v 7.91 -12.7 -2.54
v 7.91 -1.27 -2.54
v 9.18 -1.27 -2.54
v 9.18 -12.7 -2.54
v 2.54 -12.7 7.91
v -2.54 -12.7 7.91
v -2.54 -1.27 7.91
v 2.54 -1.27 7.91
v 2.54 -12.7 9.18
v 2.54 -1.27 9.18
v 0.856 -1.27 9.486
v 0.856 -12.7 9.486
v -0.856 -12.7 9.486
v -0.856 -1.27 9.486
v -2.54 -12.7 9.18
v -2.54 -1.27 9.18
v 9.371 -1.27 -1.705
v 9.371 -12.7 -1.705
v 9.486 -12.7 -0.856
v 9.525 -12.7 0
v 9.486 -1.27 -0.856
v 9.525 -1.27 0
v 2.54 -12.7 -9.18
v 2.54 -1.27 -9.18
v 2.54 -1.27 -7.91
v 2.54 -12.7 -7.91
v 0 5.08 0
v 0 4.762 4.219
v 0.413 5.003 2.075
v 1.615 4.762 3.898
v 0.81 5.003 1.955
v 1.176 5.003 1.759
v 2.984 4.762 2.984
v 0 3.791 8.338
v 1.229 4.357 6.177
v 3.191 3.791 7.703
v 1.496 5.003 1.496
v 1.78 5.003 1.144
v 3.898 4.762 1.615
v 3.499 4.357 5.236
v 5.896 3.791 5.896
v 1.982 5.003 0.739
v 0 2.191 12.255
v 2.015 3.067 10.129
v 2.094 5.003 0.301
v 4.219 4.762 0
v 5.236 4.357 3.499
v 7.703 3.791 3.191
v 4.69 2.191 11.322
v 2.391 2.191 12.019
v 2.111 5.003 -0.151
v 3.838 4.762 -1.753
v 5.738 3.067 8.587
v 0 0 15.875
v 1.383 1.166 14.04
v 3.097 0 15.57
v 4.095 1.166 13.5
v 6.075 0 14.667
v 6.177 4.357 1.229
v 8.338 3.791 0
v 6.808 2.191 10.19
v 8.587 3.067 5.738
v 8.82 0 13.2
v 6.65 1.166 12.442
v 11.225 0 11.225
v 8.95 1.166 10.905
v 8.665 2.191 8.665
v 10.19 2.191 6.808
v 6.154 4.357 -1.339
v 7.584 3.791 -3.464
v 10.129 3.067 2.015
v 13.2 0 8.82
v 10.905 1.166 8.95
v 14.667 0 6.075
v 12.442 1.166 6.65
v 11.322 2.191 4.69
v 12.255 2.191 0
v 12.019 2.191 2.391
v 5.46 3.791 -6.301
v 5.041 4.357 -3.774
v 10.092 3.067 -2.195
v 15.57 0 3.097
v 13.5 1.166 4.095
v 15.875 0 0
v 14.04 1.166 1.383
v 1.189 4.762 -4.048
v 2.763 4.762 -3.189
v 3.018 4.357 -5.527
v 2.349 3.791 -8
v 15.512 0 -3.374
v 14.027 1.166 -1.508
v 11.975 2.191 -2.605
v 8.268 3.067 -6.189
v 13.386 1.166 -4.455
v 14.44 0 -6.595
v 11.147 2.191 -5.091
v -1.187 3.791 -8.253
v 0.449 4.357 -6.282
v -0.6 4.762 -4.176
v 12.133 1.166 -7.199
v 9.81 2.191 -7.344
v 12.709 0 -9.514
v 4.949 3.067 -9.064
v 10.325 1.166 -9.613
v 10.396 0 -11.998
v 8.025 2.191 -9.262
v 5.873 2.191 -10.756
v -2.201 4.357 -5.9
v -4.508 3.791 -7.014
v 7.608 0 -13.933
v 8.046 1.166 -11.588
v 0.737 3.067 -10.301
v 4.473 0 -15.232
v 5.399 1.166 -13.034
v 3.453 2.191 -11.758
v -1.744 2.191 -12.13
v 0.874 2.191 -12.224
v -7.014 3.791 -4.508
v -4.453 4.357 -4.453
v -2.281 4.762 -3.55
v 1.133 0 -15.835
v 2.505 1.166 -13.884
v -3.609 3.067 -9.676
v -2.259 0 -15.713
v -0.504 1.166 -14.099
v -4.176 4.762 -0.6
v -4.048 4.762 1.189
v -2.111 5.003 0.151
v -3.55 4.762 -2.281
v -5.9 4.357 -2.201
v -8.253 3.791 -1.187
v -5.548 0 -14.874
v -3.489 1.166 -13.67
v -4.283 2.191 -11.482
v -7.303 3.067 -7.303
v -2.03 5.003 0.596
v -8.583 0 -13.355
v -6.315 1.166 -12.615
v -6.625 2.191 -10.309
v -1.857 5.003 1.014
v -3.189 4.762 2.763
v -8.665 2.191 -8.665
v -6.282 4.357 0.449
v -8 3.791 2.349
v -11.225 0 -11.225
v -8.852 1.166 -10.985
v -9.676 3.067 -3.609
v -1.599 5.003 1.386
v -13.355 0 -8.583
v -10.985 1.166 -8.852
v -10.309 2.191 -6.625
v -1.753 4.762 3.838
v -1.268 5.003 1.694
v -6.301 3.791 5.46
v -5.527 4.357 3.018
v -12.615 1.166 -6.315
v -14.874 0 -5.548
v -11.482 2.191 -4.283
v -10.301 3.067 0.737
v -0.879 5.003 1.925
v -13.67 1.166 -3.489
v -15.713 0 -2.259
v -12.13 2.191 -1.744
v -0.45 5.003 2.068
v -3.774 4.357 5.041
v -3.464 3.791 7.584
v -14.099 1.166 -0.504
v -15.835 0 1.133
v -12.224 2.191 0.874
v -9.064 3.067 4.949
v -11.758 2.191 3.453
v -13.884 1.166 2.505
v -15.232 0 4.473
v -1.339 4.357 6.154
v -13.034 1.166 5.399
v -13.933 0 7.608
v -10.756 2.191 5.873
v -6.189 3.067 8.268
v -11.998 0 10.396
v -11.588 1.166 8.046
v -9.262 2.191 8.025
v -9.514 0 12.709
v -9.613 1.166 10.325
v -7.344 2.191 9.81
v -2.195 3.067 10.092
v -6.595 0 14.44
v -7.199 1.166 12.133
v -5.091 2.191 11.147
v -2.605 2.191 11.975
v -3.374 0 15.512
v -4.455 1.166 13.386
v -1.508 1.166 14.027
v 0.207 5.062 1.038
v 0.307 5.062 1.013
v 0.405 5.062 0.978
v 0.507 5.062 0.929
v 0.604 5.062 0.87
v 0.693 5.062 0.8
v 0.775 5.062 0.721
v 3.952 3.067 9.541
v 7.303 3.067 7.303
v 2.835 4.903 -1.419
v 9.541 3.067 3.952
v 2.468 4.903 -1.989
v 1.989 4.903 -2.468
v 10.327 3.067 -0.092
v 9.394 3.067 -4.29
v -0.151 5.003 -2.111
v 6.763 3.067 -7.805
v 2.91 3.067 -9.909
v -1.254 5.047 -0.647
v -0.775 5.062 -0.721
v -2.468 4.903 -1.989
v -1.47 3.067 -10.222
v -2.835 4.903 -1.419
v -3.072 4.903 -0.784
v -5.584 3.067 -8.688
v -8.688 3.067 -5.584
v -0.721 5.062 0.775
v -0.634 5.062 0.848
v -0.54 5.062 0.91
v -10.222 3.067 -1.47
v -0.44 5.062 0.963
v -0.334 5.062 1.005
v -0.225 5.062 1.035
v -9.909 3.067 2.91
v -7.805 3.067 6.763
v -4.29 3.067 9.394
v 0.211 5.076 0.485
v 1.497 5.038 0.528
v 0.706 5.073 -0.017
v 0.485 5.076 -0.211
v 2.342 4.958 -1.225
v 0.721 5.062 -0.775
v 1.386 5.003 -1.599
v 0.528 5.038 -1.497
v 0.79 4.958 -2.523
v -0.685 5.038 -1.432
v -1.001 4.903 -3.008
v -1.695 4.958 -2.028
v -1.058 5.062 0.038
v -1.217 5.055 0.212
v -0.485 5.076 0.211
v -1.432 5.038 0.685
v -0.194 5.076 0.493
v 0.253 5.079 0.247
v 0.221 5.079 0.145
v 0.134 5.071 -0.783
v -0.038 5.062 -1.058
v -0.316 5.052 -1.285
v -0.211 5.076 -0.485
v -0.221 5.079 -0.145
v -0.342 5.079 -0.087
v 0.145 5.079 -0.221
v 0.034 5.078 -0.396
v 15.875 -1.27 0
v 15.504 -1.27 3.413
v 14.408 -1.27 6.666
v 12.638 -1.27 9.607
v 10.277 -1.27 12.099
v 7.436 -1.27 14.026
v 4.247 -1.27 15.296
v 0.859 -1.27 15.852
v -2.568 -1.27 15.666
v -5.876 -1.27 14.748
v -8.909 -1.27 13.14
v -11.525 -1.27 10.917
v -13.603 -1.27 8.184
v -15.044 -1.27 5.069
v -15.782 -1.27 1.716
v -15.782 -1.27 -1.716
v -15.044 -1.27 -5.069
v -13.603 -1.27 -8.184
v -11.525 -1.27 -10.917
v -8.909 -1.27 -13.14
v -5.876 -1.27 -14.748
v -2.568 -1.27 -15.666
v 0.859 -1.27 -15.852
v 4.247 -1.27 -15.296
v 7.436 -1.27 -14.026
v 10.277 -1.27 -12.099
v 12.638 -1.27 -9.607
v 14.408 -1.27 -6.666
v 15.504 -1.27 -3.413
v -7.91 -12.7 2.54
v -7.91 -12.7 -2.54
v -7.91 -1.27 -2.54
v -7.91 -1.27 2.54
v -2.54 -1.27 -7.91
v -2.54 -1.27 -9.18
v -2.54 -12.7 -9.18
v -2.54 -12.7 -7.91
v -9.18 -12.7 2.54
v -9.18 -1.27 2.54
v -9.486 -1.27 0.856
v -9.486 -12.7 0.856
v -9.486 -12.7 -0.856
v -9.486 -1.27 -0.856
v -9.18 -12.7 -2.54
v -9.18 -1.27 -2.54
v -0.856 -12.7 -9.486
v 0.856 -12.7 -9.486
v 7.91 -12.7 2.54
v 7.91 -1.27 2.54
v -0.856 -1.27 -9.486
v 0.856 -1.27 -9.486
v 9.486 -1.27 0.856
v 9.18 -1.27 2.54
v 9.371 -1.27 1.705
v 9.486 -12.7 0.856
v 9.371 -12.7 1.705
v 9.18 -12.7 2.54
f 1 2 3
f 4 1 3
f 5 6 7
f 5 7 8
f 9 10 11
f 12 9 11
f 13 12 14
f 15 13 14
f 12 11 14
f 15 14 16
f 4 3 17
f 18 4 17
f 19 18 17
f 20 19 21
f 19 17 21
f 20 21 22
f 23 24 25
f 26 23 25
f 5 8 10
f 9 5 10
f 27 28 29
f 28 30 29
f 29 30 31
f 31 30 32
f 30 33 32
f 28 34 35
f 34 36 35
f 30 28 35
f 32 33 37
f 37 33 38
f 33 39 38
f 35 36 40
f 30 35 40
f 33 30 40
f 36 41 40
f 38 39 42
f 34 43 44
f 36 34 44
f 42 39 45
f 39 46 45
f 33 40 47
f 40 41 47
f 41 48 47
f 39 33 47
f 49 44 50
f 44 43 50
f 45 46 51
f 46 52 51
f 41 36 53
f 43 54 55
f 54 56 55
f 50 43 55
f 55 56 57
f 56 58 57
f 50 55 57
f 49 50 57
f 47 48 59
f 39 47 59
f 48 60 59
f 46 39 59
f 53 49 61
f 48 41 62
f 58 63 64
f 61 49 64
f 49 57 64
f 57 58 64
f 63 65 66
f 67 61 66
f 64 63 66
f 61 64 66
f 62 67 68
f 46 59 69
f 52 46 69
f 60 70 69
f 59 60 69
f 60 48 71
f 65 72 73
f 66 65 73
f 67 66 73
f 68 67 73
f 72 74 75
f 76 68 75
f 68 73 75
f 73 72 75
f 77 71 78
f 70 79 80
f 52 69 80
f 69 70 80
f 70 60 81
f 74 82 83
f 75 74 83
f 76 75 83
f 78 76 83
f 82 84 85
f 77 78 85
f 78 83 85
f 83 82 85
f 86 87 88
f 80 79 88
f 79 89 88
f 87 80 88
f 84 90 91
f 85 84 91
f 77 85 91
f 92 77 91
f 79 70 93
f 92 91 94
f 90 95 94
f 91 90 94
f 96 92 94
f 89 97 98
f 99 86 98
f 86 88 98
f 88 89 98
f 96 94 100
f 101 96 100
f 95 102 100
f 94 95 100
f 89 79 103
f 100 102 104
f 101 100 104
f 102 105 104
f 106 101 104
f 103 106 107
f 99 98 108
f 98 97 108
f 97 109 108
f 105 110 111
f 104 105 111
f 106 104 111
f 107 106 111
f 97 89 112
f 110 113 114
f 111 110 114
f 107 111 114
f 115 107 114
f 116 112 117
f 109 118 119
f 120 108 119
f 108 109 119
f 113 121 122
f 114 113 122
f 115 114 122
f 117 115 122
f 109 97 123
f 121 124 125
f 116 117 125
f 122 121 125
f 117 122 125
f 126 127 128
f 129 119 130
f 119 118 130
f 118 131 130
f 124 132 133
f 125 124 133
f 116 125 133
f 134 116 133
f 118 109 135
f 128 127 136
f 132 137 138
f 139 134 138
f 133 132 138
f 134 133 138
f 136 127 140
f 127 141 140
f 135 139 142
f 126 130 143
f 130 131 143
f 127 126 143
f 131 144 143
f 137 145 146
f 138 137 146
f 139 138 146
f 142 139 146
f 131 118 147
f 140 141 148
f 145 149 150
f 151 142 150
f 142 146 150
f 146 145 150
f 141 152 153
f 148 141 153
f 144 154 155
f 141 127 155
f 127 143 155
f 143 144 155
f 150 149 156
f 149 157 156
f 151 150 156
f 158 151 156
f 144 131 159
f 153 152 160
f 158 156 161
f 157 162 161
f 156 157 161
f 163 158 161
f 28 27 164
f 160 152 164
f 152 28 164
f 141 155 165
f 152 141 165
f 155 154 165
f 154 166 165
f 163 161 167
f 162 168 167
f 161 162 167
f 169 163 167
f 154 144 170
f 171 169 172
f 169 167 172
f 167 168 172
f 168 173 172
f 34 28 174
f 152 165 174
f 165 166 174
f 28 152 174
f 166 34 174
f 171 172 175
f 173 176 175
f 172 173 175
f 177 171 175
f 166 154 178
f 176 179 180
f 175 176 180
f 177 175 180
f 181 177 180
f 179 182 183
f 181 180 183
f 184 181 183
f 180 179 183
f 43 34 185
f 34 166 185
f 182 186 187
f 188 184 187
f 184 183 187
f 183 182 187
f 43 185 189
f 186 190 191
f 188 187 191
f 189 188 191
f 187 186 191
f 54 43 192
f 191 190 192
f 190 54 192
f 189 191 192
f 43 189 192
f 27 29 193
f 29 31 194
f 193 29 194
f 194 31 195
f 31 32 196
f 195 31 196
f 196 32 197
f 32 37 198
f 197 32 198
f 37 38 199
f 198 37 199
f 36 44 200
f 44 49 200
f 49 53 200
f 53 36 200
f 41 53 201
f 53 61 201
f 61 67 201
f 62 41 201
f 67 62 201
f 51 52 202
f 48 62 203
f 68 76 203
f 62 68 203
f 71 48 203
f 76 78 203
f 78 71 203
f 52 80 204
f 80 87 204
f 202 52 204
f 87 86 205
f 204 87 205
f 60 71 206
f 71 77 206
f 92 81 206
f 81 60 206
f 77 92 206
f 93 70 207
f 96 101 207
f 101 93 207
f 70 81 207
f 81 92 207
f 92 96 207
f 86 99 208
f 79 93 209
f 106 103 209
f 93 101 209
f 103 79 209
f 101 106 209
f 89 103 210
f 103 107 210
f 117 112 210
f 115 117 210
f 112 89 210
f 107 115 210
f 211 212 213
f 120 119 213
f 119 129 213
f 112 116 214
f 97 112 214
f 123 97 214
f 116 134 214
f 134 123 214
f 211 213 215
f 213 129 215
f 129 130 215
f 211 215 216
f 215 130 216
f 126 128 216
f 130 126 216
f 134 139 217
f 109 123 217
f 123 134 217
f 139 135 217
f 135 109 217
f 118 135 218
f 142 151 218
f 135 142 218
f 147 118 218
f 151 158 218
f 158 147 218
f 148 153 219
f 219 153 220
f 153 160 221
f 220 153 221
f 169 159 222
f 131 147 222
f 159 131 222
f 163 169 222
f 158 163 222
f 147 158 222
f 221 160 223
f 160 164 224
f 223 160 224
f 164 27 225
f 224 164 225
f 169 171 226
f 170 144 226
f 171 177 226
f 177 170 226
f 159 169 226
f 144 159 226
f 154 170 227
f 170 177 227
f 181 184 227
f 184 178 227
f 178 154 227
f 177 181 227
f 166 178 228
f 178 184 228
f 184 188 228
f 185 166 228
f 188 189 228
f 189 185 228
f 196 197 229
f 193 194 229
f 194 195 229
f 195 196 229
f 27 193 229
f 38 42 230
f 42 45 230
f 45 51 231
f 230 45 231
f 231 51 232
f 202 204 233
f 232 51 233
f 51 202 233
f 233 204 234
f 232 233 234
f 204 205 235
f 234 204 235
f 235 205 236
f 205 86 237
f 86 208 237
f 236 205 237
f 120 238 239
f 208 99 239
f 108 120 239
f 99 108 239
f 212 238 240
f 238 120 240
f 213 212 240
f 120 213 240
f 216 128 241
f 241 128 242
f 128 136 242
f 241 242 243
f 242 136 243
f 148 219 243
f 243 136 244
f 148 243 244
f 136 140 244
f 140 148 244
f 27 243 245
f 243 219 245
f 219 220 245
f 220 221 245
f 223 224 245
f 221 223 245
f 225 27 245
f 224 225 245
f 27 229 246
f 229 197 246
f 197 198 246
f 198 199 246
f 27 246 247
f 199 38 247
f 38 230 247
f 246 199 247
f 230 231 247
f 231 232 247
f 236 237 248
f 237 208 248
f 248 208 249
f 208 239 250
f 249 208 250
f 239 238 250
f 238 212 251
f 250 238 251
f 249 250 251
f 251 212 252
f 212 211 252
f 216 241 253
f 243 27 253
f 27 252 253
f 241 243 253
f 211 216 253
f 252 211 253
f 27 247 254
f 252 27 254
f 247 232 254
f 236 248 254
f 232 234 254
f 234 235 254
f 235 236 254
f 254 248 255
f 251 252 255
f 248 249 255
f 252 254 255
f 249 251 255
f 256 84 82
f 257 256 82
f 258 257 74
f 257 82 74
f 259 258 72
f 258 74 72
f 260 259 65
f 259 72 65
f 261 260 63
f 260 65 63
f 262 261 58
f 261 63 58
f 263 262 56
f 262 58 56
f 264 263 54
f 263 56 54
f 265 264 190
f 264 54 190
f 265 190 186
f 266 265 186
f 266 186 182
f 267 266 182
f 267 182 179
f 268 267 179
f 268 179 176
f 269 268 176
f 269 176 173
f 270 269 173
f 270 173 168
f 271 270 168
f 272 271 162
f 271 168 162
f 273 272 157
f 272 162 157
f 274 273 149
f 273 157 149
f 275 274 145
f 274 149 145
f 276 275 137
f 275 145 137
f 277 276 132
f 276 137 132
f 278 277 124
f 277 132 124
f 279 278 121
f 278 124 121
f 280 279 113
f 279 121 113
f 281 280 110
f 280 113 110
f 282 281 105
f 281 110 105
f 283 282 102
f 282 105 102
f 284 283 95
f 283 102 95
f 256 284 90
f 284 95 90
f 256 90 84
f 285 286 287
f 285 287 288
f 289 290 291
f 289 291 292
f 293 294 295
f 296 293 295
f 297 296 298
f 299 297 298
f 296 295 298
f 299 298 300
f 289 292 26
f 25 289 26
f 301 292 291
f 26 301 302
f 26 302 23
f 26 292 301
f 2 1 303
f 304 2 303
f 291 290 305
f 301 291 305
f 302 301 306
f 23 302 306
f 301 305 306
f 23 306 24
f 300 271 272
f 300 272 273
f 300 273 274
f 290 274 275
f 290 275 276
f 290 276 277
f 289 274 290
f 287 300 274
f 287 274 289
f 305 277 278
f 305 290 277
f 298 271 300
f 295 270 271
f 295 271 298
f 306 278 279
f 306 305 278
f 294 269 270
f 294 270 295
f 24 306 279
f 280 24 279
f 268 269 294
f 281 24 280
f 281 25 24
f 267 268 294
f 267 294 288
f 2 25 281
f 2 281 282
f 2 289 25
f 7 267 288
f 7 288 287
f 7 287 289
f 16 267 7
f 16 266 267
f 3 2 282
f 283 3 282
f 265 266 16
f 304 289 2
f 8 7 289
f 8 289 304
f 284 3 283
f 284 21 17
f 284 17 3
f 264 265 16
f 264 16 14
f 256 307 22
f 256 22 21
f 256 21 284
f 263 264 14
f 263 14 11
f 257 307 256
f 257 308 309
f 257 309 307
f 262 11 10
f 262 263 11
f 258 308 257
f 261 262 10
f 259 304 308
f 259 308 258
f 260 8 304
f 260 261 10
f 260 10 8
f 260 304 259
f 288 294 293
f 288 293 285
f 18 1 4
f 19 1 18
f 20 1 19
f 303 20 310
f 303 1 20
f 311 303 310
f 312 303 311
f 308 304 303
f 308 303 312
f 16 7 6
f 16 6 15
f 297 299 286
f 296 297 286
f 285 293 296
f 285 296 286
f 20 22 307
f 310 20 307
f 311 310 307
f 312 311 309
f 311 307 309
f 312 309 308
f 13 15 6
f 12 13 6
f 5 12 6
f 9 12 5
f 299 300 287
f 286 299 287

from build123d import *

# Parameters (mm, degrees)
F0_W      = 5.08
F0_H      = 1.27
F0_W_2    = 1.27
F0_H_2    = 5.08
F1_DEPTH  = 12.7
F3_FACE_R = 15.875
F4_DEPTH  = 1.27


with BuildPart() as f1:
    # F0 (on Front) → F1 (new body)
    with BuildSketch(Plane.XZ):
        with Locations((0, 8.545089)):
            Rectangle(F0_W, F0_H)
        with BuildLine():
            Line((-2.54, 9.180089), (2.54, 9.180089))
            ThreePointArc((2.54, 9.180089), (0, 9.525), (-2.54, 9.180089))
        make_face()
        with Locations((-8.545089, 0)):
            Rectangle(F0_W_2, F0_H_2)
        with BuildLine():
            Line((-9.180089, -2.54), (-9.180089, 2.54))
            ThreePointArc((-9.180089, 2.54), (-9.525, 0), (-9.180089, -2.54))
        make_face()
        with BuildLine():
            ThreePointArc((-2.54, -9.180089), (0, -9.525), (2.54, -9.180089))
            Line((2.54, -9.180089), (-2.54, -9.180089))
        make_face()
        with Locations((0, -8.545089)):
            Rectangle(F0_W, F0_H)
        with Locations((8.545089, 0)):
            Rectangle(F0_W_2, F0_H_2)
        with BuildLine():
            ThreePointArc((9.180089, -2.54), (9.438378, -1.281656), (9.525, 0))
            ThreePointArc((9.525, 0), (9.438378, 1.281656), (9.180089, 2.54))
            Line((9.180089, 2.54), (9.180089, -2.54))
        make_face()
    extrude(amount=F1_DEPTH)

    # F2 (on Right) → F3 (revolve)
    with BuildSketch(Plane.YZ):
        with BuildLine():
            Line((0, 15.875), (0, 0))
            Line((0, 0), (5.08, 0))
            ThreePointArc((5.08, 0), (3.790842, 8.33777), (0, 15.875))
        make_face()
    revolve(axis=Axis((0, 2.54, 0), (0, 1, 0)))

    # F3_face (on face) → F4 (join)
    with BuildSketch(Plane.XZ):
        Circle(F3_FACE_R)
        with BuildLine():
            Line((-7.910089, 2.54), (-7.910089, -2.54))
            Line((-7.910089, -2.54), (-9.180089, -2.54))
            ThreePointArc((-9.180089, -2.54), (-9.525, 0), (-9.180089, 2.54))
            Line((-9.180089, 2.54), (-7.910089, 2.54))
        make_face(mode=Mode.SUBTRACT)
        with BuildLine():
            Line((-2.54, -9.180089), (-2.54, -7.910089))
            Line((-2.54, -7.910089), (2.54, -7.910089))
            Line((2.54, -7.910089), (2.54, -9.180089))
            ThreePointArc((2.54, -9.180089), (0, -9.525), (-2.54, -9.180089))
        make_face(mode=Mode.SUBTRACT)
        with BuildLine():
            Line((2.54, 7.910089), (-2.54, 7.910089))
            Line((-2.54, 7.910089), (-2.54, 9.180089))
            ThreePointArc((-2.54, 9.180089), (0, 9.525), (2.54, 9.180089))
            Line((2.54, 9.180089), (2.54, 7.910089))
        make_face(mode=Mode.SUBTRACT)
        with BuildLine():
            ThreePointArc((9.180089, 2.54), (9.525, 0), (9.180089, -2.54))
            Line((9.180089, -2.54), (7.910089, -2.54))
            Line((7.910089, -2.54), (7.910089, 2.54))
            Line((7.910089, 2.54), (9.180089, 2.54))
        make_face(mode=Mode.SUBTRACT)
    extrude(amount=F4_DEPTH)


solid = f1.part
